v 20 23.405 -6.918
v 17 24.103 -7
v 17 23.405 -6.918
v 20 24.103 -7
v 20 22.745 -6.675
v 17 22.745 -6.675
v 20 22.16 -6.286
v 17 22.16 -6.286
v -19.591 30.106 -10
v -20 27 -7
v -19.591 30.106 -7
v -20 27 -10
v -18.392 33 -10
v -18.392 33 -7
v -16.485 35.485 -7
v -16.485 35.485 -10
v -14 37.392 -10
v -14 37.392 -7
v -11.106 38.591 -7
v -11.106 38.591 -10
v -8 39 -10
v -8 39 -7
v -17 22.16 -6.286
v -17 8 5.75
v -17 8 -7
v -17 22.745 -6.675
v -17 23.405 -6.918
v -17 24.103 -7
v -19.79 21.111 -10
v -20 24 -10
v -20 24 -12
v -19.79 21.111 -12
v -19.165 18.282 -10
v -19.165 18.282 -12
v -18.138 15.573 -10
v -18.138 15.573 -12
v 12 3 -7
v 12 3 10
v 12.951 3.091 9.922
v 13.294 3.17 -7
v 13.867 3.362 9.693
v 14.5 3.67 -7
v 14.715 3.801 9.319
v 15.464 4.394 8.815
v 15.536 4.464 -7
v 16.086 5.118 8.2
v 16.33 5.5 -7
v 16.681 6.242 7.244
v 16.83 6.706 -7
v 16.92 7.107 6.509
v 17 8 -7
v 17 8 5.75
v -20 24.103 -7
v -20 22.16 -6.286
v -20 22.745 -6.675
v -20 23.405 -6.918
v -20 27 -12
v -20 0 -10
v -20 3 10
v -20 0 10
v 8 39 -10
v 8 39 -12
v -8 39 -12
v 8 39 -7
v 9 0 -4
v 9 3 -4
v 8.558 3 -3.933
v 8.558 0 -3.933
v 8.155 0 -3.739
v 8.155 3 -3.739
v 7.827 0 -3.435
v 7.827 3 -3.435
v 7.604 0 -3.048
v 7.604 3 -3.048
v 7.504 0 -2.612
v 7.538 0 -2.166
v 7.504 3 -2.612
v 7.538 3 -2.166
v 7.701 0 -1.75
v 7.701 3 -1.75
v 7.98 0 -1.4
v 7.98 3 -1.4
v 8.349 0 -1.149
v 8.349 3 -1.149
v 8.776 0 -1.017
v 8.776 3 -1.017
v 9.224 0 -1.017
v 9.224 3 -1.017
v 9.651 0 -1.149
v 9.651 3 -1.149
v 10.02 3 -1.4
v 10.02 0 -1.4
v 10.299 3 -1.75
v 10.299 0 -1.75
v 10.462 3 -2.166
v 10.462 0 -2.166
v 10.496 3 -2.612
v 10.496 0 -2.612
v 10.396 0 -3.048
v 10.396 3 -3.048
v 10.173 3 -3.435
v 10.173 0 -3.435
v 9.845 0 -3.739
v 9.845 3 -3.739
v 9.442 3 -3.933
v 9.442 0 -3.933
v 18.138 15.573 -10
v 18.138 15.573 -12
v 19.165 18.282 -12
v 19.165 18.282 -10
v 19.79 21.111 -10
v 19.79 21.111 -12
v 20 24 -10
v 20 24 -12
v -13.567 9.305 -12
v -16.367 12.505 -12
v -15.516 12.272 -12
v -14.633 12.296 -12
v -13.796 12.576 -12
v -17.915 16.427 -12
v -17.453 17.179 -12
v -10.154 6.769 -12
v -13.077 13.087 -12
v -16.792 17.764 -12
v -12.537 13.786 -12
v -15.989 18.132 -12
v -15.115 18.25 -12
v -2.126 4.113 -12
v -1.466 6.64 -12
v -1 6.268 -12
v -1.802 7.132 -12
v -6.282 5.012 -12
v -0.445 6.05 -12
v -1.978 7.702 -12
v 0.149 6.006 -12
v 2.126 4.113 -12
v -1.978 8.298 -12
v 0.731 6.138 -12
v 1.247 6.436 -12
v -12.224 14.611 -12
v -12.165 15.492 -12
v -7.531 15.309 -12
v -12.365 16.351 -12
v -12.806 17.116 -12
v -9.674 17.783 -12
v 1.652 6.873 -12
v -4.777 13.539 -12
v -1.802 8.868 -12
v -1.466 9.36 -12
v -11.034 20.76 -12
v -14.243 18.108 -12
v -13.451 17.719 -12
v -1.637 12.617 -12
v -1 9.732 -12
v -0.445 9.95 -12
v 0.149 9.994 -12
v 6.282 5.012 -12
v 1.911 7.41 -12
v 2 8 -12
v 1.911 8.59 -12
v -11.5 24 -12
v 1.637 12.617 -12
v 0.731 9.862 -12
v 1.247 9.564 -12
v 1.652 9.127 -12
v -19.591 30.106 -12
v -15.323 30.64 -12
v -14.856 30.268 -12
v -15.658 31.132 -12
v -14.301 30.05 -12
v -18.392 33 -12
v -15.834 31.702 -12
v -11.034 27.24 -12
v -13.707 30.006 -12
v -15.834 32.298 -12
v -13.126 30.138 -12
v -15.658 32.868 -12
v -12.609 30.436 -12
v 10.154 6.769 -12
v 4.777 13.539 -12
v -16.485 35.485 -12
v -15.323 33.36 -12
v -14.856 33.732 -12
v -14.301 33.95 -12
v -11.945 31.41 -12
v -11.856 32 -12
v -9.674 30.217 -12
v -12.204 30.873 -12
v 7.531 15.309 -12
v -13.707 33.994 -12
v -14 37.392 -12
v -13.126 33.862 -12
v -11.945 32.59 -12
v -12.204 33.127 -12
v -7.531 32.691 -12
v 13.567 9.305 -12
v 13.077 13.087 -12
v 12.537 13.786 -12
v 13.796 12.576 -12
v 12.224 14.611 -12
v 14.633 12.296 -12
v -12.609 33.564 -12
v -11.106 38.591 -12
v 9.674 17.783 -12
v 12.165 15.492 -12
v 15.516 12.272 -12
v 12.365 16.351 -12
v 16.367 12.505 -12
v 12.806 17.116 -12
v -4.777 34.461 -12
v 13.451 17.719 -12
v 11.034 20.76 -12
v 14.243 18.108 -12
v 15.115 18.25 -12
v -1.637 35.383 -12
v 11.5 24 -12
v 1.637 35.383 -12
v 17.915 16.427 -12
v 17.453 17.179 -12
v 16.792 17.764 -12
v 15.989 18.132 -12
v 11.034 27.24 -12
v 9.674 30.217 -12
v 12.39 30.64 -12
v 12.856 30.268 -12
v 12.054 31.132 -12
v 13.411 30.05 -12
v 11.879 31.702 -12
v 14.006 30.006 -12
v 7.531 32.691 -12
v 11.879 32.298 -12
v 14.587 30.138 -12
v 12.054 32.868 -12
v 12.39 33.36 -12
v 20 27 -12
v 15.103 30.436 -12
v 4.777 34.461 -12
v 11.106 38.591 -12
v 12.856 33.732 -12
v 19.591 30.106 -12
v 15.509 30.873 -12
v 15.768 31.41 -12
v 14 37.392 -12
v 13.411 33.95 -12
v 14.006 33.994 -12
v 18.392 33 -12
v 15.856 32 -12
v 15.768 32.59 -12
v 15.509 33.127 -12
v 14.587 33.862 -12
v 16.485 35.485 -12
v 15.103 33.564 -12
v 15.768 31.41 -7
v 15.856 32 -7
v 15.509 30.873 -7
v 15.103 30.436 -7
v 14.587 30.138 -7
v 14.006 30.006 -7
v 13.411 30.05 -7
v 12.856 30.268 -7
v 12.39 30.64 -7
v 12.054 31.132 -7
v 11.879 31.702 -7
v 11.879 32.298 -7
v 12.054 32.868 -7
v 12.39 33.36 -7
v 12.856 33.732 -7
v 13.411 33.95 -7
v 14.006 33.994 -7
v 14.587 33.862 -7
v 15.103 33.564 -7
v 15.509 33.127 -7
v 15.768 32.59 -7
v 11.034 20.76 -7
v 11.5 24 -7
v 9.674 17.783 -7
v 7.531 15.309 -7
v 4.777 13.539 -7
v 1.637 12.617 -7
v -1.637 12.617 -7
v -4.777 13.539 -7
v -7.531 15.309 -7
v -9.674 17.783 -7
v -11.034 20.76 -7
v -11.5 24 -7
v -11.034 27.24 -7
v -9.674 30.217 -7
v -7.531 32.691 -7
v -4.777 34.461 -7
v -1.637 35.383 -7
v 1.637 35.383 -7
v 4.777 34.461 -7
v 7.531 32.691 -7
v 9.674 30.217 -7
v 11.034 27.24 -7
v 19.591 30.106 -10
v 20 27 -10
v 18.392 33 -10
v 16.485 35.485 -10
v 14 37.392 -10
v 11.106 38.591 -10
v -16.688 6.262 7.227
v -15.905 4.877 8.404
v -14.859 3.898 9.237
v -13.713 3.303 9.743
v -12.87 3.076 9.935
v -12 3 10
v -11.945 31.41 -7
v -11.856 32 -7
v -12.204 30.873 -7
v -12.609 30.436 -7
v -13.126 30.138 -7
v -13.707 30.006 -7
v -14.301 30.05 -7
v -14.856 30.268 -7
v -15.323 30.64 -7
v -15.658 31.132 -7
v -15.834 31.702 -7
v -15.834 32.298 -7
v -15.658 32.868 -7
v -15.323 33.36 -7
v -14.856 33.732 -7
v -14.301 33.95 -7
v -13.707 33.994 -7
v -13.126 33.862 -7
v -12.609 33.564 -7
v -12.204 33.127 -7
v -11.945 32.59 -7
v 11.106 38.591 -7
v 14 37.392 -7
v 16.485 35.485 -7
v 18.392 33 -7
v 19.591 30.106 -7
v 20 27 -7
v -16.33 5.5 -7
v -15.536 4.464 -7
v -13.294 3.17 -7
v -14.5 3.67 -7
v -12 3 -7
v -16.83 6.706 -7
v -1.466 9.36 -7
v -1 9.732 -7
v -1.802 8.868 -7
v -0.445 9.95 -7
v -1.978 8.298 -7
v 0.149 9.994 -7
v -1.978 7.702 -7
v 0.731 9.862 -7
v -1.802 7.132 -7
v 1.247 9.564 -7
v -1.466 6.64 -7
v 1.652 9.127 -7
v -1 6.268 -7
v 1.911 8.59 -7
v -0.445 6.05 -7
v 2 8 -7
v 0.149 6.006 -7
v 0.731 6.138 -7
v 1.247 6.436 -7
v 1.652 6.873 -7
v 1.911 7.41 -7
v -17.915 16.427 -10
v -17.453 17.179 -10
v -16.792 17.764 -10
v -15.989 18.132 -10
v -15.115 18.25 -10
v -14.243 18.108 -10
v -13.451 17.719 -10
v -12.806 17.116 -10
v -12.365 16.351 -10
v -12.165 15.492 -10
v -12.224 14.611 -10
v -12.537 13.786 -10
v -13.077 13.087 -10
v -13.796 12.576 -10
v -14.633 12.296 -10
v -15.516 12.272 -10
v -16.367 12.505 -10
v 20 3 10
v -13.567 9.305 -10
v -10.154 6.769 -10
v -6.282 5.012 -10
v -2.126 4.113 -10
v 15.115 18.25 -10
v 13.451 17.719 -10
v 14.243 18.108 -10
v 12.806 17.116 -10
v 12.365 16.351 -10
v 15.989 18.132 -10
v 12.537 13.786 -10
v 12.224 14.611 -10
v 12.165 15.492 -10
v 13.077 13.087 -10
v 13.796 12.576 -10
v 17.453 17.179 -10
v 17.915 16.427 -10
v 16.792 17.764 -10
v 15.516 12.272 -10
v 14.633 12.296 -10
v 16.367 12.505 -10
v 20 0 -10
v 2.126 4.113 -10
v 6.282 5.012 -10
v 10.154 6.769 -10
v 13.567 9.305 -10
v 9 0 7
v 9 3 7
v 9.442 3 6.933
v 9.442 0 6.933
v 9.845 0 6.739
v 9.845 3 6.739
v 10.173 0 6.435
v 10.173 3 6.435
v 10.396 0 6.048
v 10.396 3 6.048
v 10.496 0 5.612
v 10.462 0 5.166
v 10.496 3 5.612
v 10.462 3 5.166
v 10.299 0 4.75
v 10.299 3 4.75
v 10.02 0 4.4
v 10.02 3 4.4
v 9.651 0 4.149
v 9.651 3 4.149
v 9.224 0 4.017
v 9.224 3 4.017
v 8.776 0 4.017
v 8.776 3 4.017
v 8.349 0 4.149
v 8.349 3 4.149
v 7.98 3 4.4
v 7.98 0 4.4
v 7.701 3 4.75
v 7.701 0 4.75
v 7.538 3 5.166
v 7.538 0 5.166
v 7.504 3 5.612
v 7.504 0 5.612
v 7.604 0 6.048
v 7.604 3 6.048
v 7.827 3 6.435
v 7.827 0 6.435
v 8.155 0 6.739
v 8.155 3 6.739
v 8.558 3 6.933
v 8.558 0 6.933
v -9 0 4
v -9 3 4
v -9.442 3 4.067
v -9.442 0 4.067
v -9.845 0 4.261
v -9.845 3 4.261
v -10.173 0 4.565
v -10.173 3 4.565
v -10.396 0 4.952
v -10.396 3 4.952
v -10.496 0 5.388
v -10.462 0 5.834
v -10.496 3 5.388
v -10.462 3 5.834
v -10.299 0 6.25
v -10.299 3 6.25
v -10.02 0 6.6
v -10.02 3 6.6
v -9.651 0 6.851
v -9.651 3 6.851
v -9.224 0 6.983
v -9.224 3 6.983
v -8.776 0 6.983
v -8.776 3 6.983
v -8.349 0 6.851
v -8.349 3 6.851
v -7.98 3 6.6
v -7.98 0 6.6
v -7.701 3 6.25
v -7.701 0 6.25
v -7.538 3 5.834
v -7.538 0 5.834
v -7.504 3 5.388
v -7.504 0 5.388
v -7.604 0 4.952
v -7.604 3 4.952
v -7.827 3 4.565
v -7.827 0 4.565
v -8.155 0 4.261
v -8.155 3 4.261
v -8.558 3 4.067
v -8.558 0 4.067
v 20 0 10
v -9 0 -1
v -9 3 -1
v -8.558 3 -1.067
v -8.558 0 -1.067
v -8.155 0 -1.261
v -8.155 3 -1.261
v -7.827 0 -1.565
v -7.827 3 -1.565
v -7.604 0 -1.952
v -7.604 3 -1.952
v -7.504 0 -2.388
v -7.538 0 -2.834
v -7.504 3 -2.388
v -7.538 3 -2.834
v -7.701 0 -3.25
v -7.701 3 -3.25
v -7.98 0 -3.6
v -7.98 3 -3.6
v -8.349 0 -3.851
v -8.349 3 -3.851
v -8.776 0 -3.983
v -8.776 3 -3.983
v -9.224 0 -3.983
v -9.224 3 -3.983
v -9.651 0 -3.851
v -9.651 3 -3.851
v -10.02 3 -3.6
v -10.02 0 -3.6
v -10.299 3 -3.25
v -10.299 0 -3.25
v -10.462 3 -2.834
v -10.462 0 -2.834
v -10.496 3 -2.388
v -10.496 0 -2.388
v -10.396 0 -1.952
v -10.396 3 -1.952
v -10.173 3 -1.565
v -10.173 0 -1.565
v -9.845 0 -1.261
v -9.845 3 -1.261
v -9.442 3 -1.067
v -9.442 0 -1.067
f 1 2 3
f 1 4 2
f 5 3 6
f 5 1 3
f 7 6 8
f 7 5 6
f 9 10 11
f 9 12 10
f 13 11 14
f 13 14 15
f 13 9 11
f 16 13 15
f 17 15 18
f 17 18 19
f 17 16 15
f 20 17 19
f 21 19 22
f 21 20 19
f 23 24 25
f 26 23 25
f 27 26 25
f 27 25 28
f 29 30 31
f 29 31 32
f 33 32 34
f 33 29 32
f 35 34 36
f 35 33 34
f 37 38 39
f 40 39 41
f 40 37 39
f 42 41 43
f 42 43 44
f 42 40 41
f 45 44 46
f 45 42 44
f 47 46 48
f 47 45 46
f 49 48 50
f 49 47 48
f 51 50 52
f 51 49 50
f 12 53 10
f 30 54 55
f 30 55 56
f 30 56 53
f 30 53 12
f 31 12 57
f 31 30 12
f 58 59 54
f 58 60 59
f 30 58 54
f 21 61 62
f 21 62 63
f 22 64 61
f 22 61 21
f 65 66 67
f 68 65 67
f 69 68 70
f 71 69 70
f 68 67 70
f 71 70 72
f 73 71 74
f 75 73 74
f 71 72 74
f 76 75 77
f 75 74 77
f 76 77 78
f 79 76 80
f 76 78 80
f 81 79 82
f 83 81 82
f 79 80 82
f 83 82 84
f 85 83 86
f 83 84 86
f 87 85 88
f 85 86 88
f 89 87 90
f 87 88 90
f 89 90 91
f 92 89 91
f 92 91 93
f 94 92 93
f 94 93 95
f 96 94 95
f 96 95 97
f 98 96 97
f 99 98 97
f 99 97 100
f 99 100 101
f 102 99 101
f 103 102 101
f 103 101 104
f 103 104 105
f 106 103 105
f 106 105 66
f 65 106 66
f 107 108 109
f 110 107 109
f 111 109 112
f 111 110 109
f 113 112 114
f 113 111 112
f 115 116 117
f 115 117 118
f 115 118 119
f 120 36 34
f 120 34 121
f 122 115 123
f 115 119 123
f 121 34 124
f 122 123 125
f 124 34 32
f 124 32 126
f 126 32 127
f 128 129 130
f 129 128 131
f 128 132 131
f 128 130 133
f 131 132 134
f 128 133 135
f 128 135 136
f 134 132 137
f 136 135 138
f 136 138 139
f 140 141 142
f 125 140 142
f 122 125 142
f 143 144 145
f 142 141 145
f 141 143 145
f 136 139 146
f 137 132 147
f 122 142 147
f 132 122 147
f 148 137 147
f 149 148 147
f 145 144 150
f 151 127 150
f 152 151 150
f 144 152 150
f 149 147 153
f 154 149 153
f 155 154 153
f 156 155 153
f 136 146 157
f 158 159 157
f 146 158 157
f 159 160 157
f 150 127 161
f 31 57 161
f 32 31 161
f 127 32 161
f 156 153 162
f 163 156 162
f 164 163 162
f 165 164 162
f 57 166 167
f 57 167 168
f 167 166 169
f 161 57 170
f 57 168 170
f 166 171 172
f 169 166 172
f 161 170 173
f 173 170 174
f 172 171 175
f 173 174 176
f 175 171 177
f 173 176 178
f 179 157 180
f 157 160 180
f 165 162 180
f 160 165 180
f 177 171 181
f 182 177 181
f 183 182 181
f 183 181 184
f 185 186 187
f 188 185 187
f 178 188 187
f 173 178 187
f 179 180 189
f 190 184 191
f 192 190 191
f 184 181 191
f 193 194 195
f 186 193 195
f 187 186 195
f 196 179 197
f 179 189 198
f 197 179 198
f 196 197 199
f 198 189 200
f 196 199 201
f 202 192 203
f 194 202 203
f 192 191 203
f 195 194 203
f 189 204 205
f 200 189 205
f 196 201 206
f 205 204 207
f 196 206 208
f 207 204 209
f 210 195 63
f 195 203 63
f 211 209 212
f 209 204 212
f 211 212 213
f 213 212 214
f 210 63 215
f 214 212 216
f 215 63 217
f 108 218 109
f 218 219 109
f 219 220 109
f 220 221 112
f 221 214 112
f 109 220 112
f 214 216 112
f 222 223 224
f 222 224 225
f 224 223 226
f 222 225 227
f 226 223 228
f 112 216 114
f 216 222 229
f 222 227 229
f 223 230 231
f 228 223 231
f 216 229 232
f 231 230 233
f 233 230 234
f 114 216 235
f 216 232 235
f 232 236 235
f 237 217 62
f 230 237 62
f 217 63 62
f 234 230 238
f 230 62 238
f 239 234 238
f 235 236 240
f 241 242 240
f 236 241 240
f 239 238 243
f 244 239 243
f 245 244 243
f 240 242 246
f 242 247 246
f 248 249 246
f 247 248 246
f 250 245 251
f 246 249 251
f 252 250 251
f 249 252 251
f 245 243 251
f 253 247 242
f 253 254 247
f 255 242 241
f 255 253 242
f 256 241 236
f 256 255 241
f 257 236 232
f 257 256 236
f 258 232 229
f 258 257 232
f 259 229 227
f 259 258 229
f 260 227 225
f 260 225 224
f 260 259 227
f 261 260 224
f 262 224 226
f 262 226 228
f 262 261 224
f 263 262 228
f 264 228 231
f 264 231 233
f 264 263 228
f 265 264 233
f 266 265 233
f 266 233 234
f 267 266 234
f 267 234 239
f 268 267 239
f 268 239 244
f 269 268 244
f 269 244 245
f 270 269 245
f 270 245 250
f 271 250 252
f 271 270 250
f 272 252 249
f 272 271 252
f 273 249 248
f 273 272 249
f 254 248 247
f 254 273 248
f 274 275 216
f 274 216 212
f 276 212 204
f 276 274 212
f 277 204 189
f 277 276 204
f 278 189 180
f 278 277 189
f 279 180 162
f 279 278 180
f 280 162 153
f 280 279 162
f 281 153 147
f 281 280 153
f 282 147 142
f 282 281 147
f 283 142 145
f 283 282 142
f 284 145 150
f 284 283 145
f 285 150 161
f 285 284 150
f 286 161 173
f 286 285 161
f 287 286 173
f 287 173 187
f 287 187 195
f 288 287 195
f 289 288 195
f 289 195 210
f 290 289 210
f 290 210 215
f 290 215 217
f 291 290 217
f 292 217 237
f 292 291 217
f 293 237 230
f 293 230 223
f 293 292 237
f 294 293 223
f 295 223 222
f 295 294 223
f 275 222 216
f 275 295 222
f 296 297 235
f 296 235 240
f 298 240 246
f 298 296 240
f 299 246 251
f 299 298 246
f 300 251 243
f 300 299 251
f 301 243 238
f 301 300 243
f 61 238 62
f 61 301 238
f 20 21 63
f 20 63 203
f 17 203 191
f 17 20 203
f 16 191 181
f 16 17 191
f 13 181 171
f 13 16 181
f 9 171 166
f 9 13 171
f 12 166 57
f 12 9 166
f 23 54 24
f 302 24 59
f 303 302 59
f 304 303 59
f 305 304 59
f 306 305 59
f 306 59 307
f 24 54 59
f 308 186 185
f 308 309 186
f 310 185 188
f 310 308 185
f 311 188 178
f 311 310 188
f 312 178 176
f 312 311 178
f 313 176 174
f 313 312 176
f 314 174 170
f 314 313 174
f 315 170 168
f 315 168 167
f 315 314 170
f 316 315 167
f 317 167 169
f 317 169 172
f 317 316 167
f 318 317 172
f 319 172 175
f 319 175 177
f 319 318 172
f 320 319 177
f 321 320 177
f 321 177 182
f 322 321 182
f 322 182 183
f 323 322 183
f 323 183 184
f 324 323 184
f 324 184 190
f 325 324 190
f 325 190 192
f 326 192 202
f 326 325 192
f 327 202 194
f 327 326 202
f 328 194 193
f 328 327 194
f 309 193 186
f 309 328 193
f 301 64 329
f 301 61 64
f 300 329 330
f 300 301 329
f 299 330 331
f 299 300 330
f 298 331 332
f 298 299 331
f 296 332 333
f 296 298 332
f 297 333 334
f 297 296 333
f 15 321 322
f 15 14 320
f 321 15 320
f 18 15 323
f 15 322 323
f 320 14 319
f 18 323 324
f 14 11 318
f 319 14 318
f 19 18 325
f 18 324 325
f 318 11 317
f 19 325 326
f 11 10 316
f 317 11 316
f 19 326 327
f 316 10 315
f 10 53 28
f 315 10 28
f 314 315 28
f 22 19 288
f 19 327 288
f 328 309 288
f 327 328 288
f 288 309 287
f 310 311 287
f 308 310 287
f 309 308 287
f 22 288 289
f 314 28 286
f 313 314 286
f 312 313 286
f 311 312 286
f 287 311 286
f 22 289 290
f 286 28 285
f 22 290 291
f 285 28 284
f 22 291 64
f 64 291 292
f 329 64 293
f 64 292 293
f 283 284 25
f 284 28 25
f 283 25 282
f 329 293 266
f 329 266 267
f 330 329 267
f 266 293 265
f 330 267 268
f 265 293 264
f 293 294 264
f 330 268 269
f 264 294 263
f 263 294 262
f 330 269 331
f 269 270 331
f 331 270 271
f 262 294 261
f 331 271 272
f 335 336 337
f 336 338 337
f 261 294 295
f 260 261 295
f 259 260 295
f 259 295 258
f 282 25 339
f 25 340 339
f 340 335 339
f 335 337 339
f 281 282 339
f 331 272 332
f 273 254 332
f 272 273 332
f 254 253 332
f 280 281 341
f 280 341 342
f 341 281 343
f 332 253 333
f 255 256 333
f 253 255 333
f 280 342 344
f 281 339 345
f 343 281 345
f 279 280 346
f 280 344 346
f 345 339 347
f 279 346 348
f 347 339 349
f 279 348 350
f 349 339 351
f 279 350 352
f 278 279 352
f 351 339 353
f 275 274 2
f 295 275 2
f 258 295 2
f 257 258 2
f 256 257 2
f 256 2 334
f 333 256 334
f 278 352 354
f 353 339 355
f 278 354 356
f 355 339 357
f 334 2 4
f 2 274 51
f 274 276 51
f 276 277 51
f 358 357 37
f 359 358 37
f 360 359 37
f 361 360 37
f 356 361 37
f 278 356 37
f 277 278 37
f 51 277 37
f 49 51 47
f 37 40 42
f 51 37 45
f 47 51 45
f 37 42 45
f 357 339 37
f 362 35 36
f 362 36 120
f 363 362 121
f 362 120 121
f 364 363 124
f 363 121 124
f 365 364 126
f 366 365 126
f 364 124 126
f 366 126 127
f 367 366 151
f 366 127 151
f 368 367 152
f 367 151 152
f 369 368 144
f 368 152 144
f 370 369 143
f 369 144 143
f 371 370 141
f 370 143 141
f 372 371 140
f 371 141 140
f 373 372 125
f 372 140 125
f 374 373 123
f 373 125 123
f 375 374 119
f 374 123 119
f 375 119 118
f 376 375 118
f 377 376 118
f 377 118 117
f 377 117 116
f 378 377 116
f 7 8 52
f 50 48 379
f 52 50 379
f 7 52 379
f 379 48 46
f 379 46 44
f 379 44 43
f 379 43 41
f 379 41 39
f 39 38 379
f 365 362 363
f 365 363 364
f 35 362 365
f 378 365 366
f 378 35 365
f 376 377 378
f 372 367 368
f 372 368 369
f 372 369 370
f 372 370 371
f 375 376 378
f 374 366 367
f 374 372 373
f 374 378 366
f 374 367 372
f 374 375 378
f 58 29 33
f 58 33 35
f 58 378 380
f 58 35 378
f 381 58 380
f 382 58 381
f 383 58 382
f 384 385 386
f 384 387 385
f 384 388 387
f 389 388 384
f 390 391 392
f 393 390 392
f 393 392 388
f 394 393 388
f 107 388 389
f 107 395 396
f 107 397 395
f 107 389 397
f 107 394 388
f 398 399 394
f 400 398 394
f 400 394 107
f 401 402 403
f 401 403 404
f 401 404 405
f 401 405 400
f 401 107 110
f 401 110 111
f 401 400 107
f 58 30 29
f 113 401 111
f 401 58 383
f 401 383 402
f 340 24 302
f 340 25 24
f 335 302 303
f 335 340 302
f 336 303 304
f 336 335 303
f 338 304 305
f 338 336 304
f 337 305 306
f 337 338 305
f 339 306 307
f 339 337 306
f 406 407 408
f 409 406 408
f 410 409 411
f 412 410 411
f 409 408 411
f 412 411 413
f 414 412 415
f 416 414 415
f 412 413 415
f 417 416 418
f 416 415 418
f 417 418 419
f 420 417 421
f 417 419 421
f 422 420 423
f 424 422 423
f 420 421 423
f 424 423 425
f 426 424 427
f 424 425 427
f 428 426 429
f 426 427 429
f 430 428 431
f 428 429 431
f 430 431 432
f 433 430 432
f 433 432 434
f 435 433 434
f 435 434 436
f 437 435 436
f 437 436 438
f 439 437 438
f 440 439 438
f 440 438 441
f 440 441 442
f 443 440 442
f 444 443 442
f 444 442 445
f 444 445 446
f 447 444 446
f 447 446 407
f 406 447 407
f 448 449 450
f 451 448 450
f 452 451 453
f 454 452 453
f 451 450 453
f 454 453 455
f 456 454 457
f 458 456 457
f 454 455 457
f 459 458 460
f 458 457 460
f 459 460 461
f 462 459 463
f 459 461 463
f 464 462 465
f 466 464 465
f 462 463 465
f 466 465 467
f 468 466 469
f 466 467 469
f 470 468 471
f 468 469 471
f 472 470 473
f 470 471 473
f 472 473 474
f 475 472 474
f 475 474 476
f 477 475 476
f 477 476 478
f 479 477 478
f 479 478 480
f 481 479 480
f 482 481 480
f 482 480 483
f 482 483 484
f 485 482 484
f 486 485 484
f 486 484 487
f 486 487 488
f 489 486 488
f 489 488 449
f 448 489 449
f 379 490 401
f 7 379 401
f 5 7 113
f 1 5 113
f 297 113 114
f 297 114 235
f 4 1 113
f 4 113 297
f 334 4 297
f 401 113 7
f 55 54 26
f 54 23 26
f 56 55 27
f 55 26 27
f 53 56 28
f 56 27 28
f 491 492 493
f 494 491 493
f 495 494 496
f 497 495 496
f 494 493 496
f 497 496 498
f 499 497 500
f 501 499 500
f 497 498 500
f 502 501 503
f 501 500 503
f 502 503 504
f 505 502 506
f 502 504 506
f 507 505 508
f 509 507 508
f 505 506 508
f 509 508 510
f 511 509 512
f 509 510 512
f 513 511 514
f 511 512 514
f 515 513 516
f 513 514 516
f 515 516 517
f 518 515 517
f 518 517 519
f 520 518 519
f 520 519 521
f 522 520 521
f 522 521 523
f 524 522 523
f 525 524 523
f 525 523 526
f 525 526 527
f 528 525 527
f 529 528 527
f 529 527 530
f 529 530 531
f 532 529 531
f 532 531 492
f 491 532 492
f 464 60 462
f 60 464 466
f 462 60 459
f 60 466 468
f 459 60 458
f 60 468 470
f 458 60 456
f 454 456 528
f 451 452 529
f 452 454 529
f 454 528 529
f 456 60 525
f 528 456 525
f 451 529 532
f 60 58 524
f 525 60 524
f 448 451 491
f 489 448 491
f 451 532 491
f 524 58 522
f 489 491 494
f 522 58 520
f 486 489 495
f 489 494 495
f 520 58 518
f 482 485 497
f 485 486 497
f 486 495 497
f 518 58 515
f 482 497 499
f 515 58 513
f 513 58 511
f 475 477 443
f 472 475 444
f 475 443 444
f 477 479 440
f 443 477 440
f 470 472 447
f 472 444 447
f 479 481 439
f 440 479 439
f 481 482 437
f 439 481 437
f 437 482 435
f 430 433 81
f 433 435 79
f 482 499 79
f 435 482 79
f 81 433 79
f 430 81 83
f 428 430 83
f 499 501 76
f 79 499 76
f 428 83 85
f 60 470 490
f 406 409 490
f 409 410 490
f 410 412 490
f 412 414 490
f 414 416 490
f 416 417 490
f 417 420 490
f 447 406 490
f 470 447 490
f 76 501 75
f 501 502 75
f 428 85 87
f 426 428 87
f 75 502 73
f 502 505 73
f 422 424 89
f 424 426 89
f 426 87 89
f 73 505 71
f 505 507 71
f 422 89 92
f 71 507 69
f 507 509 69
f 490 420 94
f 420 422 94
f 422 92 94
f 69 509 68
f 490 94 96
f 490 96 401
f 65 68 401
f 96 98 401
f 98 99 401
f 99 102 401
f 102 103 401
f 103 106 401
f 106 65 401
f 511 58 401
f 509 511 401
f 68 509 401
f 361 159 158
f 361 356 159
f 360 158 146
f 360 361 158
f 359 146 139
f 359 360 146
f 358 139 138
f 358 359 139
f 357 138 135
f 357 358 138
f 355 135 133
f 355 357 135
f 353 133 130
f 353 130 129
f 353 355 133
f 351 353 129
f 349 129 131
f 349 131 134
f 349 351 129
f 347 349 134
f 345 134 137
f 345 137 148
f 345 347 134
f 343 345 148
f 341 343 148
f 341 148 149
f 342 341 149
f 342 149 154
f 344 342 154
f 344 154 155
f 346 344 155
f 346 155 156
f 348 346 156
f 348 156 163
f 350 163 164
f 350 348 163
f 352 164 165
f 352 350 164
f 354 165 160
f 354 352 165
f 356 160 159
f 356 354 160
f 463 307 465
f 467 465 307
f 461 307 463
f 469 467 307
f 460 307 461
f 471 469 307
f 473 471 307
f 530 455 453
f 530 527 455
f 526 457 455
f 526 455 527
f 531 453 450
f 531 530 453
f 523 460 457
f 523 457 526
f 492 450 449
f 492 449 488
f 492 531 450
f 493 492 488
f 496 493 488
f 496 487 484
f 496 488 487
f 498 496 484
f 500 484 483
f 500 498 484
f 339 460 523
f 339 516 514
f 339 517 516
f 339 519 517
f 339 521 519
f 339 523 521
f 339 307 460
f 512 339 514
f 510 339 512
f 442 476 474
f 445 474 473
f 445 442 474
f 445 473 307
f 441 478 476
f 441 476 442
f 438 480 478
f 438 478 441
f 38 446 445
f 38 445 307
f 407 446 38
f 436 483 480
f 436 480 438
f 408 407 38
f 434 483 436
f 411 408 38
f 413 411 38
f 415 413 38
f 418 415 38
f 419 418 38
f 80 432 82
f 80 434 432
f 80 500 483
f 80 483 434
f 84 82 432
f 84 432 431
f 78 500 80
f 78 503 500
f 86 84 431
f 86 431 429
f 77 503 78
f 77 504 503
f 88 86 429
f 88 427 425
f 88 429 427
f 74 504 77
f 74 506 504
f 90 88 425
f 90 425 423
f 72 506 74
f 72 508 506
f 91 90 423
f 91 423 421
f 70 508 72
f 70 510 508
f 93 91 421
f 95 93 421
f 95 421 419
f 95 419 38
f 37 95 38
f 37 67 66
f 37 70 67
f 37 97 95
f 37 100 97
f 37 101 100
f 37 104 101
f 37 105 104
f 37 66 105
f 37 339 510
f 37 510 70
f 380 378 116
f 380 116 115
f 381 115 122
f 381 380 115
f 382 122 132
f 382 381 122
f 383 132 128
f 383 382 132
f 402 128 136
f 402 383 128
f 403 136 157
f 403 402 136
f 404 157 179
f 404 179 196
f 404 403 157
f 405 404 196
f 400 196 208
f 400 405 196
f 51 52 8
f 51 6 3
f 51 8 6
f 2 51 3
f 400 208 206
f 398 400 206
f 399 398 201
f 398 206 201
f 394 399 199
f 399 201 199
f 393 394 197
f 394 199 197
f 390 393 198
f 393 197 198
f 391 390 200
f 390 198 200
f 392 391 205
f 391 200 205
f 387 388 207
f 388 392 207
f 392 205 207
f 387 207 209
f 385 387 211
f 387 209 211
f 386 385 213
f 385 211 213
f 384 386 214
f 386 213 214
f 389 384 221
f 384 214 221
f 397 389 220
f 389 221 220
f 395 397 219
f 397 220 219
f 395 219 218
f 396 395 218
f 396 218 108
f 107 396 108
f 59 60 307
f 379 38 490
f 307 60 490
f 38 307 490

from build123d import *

# Parameters (mm, degrees)
SKETCH_1_W           = 40
SKETCH_1_H           = 20
EXTRUDE_1_DEPTH      = 3
SKETCH_2_W           = 40
SKETCH_2_H           = 3
EXTRUDE_2_DEPTH      = 36
SKETCH_3_R           = 11.5
SKETCH_3_R_2         = 2
CUT_EXTRUDE_M5_DEPTH = 48.010637094
FILLET_1_R           = 12
SKETCH_4_R           = 2
SKETCH_4_R_2         = 11.5
EXTRUDE_3_DEPTH      = 2
SKETCH_5_R           = 3
CUT_EXTRUDE_2_DEPTH  = 2
SKETCH_6_W           = 3
SKETCH_6_H           = 17
EXTRUDE_4_DEPTH      = 20
CUT_EXTRUDE_3_DEPTH  = 58.140178509
SKETCH_8_R           = 1.5
CUT_EXTRUDE_4_DEPTH  = 43.895221179
FILLET_2_R           = 5
FILLET_3_R           = 3


with BuildPart() as part:
    # 草图1 → 凸台-拉伸1 (new body)
    with BuildSketch(Plane(origin=(0, 0, 0), x_dir=(1, 0, 0), z_dir=(0, 1, 0))):
        Rectangle(SKETCH_1_W, SKETCH_1_H)
    extrude(amount=EXTRUDE_1_DEPTH)

    # 草图2 → 凸台-拉伸2 (add)
    with BuildSketch(Plane(origin=(0, 3, 0), x_dir=(1, 0, 0), z_dir=(0, 1, 0))):
        with Locations((0, 8.5)):
            Rectangle(SKETCH_2_W, SKETCH_2_H)
    extrude(amount=EXTRUDE_2_DEPTH)

    # 草图3 → 螺纹-M5 (cut, through all)
    with BuildSketch(Plane.XY.offset(-7)):
        with Locations((0, 24)):
            Circle(SKETCH_3_R)
        with Locations((13.856406461, 32)):
            Circle(SKETCH_3_R_2)
        with Locations((0, 8)):
            Circle(SKETCH_3_R_2)
        with Locations((-13.856406461, 32)):
            Circle(SKETCH_3_R_2)
    extrude(amount=-CUT_EXTRUDE_M5_DEPTH, mode=Mode.SUBTRACT)

    # 圆角1
    fillet_1_edges = [part.edges().sort_by_distance(p)[0] for p in [
        (-20, 39, -8.5),
        (20, 39, -8.5),
    ]]
    fillet(fillet_1_edges, radius=FILLET_1_R)

    # 草图4 → 凸台-拉伸3 (add)
    with BuildSketch(Plane(origin=(0, 0, -10), x_dir=(-1, 0, 0), z_dir=(0, 0, -1))):
        with BuildLine():
            Line((-8, 39), (8, 39))
            ThreePointArc((8, 39), (16.485281374, 35.485281374), (20, 27))
            Line((20, 27), (20, 24))
            ThreePointArc((20, 24), (0, 4), (-20, 24))
            Line((-20, 24), (-20, 27))
            ThreePointArc((-20, 27), (-16.485281374, 35.485281374), (-8, 39))
        make_face()
        with Locations(Location((0, 8, 0), (0, 0, 180))):
            Circle(SKETCH_4_R, mode=Mode.SUBTRACT)
        with Locations(Location((13.856406461, 32, 0), (0, 0, 180))):
            Circle(SKETCH_4_R, mode=Mode.SUBTRACT)
        with Locations(Location((-13.856406461, 32, 0), (0, 0, 180))):
            Circle(SKETCH_4_R, mode=Mode.SUBTRACT)
        with Locations(Location((0, 24, 0), (0, 0, 180))):
            Circle(SKETCH_4_R_2, mode=Mode.SUBTRACT)
    extrude(amount=EXTRUDE_3_DEPTH)

    # 草图5 → 切除-拉伸2 (cut)
    with BuildSketch(Plane(origin=(0, 0, -12), x_dir=(-1, 0, 0), z_dir=(0, 0, -1))):
        with Locations((-15.155444566, 15.25)):
            Circle(SKETCH_5_R)
        with Locations((15.155444566, 15.25)):
            Circle(SKETCH_5_R)
    extrude(amount=-CUT_EXTRUDE_2_DEPTH, mode=Mode.SUBTRACT)

    # 草图6 → 凸台-拉伸4 (add)
    with BuildSketch(Plane(origin=(0, 3, 0), x_dir=(1, 0, 0), z_dir=(0, 1, 0))):
        with Locations((-18.5, -1.5)):
            Rectangle(SKETCH_6_W, SKETCH_6_H)
        with Locations((18.5, -1.5)):
            Rectangle(SKETCH_6_W, SKETCH_6_H)
    extrude(amount=EXTRUDE_4_DEPTH)

    # 草图7 → 切除-拉伸3 (cut, through all)
    with BuildSketch(Plane.ZY.offset(20)):
        Polygon((-7, 23), (10, 3), (10, 23), align=None)
    extrude(amount=-CUT_EXTRUDE_3_DEPTH, mode=Mode.SUBTRACT)

    # 草图8 → 切除-拉伸4 (cut, through all)
    with BuildSketch(Plane(origin=(0, 3, 0), x_dir=(1, 0, 0), z_dir=(0, 1, 0))):
        with Locations(Location((-9, 2.5, 0), (0, 0, 270))):
            Circle(SKETCH_8_R)
        with Locations(Location((9, 2.5, 0), (0, 0, 90))):
            Circle(SKETCH_8_R)
        with Locations(Location((9, -5.5, 0), (0, 0, 270))):
            Circle(SKETCH_8_R)
        with Locations(Location((-9, -5.5, 0), (0, 0, 90))):
            Circle(SKETCH_8_R)
    extrude(amount=-CUT_EXTRUDE_4_DEPTH, mode=Mode.SUBTRACT)

    # 圆角2
    fillet_2_edges = [part.edges().sort_by_distance(p)[0] for p in [
        (-17, 3, 1.5),
        (17, 3, 1.5),
    ]]
    fillet(fillet_2_edges, radius=FILLET_2_R)

    # 圆角3
    fillet_3_edges = [part.edges().sort_by_distance(p)[0] for p in [
        (-18.5, 23, -7),
        (18.5, 23, -7),
    ]]
    fillet(fillet_3_edges, radius=FILLET_3_R)


solid = part.part
